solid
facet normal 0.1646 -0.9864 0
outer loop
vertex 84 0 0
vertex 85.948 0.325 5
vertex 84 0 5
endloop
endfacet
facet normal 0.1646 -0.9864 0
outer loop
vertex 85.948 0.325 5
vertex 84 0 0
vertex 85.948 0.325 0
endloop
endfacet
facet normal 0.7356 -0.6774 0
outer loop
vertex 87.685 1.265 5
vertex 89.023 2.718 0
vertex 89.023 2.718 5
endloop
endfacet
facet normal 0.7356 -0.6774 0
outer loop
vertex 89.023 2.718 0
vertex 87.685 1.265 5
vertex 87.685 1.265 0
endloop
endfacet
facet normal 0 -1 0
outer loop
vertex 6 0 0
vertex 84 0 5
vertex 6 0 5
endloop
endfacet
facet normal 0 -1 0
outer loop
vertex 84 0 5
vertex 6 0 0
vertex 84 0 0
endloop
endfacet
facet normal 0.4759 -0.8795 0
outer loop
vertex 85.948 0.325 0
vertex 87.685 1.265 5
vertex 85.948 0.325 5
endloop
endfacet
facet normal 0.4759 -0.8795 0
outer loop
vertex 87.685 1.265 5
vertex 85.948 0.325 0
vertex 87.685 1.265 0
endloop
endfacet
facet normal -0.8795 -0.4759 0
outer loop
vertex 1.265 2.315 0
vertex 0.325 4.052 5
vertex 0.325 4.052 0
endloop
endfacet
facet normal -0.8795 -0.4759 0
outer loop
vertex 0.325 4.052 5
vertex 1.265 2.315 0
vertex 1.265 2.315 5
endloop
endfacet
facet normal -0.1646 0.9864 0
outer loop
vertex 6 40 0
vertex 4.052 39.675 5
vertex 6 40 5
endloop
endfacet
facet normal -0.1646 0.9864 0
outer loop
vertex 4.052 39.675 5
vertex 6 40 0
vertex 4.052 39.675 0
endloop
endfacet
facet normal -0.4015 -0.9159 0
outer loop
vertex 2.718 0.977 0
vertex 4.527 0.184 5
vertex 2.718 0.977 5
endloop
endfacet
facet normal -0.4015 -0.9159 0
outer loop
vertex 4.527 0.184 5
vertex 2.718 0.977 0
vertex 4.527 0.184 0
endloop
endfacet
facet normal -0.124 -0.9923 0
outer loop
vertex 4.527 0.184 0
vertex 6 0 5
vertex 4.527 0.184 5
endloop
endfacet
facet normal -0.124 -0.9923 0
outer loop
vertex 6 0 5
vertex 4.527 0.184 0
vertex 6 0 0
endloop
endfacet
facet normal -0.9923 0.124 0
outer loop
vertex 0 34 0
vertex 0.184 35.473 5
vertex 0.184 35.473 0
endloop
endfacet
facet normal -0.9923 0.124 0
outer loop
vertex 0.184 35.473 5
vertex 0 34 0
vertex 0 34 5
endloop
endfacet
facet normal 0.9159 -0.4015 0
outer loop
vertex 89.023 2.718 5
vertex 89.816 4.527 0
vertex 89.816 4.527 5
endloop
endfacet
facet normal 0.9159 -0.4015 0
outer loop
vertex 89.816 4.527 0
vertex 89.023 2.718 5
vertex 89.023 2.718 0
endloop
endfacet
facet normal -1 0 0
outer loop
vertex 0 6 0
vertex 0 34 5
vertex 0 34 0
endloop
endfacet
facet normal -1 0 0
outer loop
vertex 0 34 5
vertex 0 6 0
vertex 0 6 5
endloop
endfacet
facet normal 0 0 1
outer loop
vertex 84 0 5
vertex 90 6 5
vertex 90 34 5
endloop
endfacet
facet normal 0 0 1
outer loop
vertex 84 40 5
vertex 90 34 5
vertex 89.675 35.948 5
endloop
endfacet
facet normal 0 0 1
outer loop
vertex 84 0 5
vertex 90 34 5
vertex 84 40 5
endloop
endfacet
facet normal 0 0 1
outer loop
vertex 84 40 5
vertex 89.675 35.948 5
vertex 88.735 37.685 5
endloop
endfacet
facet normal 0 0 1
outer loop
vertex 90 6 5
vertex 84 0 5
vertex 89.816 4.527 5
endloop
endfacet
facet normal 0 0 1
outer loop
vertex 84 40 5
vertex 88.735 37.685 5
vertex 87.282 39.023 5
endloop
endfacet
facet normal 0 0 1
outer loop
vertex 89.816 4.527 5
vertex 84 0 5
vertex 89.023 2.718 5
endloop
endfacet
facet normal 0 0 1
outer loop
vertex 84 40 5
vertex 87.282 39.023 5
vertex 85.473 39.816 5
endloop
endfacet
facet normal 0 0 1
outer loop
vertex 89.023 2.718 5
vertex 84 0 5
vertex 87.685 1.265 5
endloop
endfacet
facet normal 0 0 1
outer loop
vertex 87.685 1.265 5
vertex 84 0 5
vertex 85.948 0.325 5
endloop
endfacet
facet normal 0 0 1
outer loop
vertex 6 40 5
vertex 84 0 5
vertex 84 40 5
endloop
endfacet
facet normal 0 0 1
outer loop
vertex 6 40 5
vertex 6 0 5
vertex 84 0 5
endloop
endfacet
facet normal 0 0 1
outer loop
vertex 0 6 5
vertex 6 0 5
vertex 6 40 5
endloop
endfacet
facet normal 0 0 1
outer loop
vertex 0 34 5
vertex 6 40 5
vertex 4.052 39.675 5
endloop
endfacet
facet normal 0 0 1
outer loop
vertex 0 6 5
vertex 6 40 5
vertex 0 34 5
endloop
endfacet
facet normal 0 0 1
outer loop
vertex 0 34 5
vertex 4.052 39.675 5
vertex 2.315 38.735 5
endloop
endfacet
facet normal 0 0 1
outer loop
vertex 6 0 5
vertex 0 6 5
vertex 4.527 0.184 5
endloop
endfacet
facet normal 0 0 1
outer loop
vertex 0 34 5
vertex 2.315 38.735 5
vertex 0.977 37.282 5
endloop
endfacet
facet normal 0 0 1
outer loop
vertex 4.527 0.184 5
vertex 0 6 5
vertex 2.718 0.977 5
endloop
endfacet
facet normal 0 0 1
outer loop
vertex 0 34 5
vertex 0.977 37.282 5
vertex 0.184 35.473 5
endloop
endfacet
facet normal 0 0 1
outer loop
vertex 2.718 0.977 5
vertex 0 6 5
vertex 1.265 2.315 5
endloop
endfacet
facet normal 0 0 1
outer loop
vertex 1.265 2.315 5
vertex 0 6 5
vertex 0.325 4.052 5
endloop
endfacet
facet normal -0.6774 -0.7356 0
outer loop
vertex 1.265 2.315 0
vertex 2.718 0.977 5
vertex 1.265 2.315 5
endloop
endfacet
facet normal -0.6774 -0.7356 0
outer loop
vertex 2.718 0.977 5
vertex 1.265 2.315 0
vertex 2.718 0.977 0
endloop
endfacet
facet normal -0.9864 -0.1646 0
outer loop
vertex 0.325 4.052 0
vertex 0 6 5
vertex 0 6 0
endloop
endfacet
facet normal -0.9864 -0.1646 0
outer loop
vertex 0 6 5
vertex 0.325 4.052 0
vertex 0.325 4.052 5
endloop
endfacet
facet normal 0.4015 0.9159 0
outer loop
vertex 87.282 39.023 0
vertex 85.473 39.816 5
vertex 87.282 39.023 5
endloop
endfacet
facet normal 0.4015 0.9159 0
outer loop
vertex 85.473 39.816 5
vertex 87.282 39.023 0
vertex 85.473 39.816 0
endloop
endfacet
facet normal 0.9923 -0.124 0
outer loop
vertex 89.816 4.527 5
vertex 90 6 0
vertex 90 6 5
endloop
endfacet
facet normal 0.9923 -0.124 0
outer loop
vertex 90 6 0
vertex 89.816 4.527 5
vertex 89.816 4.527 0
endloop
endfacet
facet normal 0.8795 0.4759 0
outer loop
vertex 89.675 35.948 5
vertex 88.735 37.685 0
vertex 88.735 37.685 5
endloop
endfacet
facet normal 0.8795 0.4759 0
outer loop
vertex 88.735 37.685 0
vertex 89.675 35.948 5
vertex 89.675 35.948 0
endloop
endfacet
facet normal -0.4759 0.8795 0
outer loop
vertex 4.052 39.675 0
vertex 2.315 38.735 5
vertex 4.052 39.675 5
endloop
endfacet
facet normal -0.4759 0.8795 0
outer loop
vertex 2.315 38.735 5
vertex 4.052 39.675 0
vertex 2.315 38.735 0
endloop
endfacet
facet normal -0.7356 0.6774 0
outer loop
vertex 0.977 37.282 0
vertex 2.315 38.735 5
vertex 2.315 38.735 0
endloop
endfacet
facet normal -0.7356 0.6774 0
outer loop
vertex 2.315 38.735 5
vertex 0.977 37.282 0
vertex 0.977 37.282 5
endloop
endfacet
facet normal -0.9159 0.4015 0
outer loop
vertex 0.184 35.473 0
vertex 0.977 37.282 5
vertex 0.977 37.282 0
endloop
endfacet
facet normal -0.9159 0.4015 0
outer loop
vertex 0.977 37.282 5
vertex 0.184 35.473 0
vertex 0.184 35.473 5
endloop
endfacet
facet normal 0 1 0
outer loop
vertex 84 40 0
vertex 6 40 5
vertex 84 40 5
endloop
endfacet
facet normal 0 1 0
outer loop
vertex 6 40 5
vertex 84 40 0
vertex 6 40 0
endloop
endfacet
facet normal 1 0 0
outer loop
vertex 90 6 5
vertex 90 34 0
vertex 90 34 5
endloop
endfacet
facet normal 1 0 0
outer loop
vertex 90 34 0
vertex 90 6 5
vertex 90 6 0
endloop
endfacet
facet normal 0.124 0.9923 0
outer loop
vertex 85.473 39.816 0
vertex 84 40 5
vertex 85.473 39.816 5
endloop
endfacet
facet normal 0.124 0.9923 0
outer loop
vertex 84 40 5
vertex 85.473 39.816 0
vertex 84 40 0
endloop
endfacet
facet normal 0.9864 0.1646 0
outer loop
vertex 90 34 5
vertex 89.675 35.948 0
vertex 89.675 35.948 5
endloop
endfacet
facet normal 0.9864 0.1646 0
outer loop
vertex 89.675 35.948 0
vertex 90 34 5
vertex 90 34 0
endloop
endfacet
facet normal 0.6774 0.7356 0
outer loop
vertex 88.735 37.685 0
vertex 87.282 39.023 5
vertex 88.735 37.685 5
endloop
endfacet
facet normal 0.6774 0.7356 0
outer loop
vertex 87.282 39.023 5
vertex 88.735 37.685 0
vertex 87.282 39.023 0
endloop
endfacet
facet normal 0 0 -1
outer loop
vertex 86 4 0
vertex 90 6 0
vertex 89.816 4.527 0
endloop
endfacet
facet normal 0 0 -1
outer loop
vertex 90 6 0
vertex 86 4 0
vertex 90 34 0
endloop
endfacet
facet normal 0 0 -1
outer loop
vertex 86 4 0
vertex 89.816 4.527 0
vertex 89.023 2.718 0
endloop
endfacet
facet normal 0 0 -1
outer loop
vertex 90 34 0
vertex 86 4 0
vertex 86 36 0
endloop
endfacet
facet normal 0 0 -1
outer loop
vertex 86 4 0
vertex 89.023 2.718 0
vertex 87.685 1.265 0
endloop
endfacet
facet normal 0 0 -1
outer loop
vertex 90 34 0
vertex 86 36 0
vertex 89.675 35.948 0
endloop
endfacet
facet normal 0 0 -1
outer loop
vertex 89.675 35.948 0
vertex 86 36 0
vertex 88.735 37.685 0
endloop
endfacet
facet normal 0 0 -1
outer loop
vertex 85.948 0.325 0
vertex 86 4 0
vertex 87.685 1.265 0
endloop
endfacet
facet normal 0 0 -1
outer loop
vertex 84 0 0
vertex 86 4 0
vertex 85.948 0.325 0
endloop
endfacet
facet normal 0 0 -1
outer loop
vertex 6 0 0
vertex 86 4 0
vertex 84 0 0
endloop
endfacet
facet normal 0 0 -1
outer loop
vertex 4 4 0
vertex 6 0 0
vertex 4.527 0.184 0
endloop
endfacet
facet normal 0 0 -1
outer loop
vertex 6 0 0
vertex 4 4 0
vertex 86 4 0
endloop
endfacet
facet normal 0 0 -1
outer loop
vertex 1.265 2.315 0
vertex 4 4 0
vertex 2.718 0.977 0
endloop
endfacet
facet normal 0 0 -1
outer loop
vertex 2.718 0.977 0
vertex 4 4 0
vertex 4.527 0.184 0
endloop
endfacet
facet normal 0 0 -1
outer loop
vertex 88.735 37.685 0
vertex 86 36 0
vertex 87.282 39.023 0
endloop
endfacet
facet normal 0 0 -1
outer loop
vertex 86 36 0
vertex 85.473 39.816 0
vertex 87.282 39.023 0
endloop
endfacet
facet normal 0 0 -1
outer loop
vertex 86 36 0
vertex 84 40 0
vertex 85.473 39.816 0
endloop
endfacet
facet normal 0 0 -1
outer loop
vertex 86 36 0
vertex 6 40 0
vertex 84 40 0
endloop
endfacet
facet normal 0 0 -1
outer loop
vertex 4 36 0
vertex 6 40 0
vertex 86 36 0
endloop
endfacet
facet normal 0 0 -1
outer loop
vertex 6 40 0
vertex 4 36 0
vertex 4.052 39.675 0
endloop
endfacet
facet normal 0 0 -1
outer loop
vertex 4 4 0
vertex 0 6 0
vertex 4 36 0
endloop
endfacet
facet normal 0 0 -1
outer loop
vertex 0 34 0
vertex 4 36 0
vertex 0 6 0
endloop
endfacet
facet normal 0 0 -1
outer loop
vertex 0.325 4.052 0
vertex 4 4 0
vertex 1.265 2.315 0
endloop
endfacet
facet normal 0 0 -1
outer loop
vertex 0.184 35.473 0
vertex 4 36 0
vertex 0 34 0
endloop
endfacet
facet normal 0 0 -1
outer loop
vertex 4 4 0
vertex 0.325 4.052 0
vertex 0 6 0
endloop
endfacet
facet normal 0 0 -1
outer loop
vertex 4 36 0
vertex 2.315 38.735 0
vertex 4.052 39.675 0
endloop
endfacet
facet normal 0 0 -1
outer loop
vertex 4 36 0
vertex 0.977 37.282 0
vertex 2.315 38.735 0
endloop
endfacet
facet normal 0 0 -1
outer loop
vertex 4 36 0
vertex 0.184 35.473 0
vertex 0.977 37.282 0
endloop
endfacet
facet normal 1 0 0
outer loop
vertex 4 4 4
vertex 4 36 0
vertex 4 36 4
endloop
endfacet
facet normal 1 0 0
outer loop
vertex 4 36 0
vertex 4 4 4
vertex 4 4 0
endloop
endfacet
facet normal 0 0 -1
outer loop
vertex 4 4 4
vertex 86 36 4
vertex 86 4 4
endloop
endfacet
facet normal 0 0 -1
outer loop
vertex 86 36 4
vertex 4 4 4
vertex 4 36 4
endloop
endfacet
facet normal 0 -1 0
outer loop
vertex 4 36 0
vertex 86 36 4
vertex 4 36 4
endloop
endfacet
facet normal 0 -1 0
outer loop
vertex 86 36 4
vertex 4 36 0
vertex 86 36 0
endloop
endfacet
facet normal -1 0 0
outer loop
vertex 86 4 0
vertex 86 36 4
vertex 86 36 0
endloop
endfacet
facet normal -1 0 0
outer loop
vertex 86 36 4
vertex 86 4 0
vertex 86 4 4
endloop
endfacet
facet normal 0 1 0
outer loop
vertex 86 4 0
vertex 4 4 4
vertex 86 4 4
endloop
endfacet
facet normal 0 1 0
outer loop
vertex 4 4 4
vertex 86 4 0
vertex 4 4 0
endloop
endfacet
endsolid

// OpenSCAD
appleWatchDiameter = 27 + 2;
pixelWatchLength = 41 + 2;
pixelWatchWidth = 27 + 2;
wireWidth = 4;
width = 90;
height = 40;
depth = 5;
basePlateHeight = 5;
cavity = 8;
cornerRadius = 6;

module applewatchcharger() {
  circle(d=appleWatchDiameter, $fn=256);
}

module pixelwatchcharger() {
  $fn = 128;

  r = pixelWatchWidth / 2;
  straight = pixelWatchLength - pixelWatchWidth;

  hull() {
    translate([-straight / 2, 0])
      circle(r=r);
    translate([straight / 2, 0])
      circle(r=r);
  }
}

module bottom() {
  xSpace = (width - (appleWatchDiameter + pixelWatchLength)) / 3;
  ySpace = (height - appleWatchDiameter) / 2;

  appleWatchCenterX = (appleWatchDiameter / 2) + xSpace;
  pixelWatchCenterX = (2 * xSpace + appleWatchDiameter) + (pixelWatchLength / 2);

  difference() {
    linear_extrude(height=depth) offset(r=cornerRadius) offset(delta=-cornerRadius) square(size=[width, height]);
    color("pink") translate([cavity / 2, cavity / 2, -1])
        linear_extrude(height=depth) square(size=[width - cavity, height - cavity]);
  }

}

module top() {
  xSpace = (width - (appleWatchDiameter + pixelWatchLength)) / 3;
  ySpace = (height - appleWatchDiameter) / 2;

  appleWatchCenterX = (appleWatchDiameter / 2) + xSpace;
  pixelWatchCenterX = (2 * xSpace + appleWatchDiameter) + (pixelWatchLength / 2);

  translate([0, 0, basePlateHeight]) linear_extrude(height=depth)
      difference() {
        offset(r=cornerRadius) offset(delta=-cornerRadius) square(size=[width, height]);
        color("orange") translate([appleWatchCenterX, (appleWatchDiameter / 2) + ySpace])
            applewatchcharger();
        translate([appleWatchCenterX - (wireWidth / 2), 0]) square([4, height / 4]);

        color("purple") translate([pixelWatchCenterX, (appleWatchDiameter / 2) + ySpace])
            pixelwatchcharger();
        translate([pixelWatchCenterX - (wireWidth / 2), 0]) square([4, height / 4]);
      }
}

module dock() {
  xSpace = (width - (appleWatchDiameter + pixelWatchLength)) / 3;
  ySpace = (height - appleWatchDiameter) / 2;

  appleWatchCenterX = (appleWatchDiameter / 2) + xSpace;
  pixelWatchCenterX = (2 * xSpace + appleWatchDiameter) + (pixelWatchLength / 2);

  difference() {
    linear_extrude(height=depth) offset(r=cornerRadius) offset(delta=-cornerRadius) square(size=[width, height]);
    color("pink") translate([cavity / 2, cavity / 2, -1])
        linear_extrude(height=depth) square(size=[width - cavity, height - cavity]);
  }

  translate([0, 0, basePlateHeight]) linear_extrude(height=depth)
      difference() {
        offset(r=cornerRadius) offset(delta=-cornerRadius) square(size=[width, height]);
        color("orange") translate([appleWatchCenterX, (appleWatchDiameter / 2) + ySpace])
            applewatchcharger();
        translate([appleWatchCenterX - (wireWidth / 2), 0]) square([4, height / 4]);

        color("purple") translate([pixelWatchCenterX, (appleWatchDiameter / 2) + ySpace])
            pixelwatchcharger();
        translate([pixelWatchCenterX - (wireWidth / 2), 0]) square([4, height / 4]);
      }
}

// top();
bottom();
